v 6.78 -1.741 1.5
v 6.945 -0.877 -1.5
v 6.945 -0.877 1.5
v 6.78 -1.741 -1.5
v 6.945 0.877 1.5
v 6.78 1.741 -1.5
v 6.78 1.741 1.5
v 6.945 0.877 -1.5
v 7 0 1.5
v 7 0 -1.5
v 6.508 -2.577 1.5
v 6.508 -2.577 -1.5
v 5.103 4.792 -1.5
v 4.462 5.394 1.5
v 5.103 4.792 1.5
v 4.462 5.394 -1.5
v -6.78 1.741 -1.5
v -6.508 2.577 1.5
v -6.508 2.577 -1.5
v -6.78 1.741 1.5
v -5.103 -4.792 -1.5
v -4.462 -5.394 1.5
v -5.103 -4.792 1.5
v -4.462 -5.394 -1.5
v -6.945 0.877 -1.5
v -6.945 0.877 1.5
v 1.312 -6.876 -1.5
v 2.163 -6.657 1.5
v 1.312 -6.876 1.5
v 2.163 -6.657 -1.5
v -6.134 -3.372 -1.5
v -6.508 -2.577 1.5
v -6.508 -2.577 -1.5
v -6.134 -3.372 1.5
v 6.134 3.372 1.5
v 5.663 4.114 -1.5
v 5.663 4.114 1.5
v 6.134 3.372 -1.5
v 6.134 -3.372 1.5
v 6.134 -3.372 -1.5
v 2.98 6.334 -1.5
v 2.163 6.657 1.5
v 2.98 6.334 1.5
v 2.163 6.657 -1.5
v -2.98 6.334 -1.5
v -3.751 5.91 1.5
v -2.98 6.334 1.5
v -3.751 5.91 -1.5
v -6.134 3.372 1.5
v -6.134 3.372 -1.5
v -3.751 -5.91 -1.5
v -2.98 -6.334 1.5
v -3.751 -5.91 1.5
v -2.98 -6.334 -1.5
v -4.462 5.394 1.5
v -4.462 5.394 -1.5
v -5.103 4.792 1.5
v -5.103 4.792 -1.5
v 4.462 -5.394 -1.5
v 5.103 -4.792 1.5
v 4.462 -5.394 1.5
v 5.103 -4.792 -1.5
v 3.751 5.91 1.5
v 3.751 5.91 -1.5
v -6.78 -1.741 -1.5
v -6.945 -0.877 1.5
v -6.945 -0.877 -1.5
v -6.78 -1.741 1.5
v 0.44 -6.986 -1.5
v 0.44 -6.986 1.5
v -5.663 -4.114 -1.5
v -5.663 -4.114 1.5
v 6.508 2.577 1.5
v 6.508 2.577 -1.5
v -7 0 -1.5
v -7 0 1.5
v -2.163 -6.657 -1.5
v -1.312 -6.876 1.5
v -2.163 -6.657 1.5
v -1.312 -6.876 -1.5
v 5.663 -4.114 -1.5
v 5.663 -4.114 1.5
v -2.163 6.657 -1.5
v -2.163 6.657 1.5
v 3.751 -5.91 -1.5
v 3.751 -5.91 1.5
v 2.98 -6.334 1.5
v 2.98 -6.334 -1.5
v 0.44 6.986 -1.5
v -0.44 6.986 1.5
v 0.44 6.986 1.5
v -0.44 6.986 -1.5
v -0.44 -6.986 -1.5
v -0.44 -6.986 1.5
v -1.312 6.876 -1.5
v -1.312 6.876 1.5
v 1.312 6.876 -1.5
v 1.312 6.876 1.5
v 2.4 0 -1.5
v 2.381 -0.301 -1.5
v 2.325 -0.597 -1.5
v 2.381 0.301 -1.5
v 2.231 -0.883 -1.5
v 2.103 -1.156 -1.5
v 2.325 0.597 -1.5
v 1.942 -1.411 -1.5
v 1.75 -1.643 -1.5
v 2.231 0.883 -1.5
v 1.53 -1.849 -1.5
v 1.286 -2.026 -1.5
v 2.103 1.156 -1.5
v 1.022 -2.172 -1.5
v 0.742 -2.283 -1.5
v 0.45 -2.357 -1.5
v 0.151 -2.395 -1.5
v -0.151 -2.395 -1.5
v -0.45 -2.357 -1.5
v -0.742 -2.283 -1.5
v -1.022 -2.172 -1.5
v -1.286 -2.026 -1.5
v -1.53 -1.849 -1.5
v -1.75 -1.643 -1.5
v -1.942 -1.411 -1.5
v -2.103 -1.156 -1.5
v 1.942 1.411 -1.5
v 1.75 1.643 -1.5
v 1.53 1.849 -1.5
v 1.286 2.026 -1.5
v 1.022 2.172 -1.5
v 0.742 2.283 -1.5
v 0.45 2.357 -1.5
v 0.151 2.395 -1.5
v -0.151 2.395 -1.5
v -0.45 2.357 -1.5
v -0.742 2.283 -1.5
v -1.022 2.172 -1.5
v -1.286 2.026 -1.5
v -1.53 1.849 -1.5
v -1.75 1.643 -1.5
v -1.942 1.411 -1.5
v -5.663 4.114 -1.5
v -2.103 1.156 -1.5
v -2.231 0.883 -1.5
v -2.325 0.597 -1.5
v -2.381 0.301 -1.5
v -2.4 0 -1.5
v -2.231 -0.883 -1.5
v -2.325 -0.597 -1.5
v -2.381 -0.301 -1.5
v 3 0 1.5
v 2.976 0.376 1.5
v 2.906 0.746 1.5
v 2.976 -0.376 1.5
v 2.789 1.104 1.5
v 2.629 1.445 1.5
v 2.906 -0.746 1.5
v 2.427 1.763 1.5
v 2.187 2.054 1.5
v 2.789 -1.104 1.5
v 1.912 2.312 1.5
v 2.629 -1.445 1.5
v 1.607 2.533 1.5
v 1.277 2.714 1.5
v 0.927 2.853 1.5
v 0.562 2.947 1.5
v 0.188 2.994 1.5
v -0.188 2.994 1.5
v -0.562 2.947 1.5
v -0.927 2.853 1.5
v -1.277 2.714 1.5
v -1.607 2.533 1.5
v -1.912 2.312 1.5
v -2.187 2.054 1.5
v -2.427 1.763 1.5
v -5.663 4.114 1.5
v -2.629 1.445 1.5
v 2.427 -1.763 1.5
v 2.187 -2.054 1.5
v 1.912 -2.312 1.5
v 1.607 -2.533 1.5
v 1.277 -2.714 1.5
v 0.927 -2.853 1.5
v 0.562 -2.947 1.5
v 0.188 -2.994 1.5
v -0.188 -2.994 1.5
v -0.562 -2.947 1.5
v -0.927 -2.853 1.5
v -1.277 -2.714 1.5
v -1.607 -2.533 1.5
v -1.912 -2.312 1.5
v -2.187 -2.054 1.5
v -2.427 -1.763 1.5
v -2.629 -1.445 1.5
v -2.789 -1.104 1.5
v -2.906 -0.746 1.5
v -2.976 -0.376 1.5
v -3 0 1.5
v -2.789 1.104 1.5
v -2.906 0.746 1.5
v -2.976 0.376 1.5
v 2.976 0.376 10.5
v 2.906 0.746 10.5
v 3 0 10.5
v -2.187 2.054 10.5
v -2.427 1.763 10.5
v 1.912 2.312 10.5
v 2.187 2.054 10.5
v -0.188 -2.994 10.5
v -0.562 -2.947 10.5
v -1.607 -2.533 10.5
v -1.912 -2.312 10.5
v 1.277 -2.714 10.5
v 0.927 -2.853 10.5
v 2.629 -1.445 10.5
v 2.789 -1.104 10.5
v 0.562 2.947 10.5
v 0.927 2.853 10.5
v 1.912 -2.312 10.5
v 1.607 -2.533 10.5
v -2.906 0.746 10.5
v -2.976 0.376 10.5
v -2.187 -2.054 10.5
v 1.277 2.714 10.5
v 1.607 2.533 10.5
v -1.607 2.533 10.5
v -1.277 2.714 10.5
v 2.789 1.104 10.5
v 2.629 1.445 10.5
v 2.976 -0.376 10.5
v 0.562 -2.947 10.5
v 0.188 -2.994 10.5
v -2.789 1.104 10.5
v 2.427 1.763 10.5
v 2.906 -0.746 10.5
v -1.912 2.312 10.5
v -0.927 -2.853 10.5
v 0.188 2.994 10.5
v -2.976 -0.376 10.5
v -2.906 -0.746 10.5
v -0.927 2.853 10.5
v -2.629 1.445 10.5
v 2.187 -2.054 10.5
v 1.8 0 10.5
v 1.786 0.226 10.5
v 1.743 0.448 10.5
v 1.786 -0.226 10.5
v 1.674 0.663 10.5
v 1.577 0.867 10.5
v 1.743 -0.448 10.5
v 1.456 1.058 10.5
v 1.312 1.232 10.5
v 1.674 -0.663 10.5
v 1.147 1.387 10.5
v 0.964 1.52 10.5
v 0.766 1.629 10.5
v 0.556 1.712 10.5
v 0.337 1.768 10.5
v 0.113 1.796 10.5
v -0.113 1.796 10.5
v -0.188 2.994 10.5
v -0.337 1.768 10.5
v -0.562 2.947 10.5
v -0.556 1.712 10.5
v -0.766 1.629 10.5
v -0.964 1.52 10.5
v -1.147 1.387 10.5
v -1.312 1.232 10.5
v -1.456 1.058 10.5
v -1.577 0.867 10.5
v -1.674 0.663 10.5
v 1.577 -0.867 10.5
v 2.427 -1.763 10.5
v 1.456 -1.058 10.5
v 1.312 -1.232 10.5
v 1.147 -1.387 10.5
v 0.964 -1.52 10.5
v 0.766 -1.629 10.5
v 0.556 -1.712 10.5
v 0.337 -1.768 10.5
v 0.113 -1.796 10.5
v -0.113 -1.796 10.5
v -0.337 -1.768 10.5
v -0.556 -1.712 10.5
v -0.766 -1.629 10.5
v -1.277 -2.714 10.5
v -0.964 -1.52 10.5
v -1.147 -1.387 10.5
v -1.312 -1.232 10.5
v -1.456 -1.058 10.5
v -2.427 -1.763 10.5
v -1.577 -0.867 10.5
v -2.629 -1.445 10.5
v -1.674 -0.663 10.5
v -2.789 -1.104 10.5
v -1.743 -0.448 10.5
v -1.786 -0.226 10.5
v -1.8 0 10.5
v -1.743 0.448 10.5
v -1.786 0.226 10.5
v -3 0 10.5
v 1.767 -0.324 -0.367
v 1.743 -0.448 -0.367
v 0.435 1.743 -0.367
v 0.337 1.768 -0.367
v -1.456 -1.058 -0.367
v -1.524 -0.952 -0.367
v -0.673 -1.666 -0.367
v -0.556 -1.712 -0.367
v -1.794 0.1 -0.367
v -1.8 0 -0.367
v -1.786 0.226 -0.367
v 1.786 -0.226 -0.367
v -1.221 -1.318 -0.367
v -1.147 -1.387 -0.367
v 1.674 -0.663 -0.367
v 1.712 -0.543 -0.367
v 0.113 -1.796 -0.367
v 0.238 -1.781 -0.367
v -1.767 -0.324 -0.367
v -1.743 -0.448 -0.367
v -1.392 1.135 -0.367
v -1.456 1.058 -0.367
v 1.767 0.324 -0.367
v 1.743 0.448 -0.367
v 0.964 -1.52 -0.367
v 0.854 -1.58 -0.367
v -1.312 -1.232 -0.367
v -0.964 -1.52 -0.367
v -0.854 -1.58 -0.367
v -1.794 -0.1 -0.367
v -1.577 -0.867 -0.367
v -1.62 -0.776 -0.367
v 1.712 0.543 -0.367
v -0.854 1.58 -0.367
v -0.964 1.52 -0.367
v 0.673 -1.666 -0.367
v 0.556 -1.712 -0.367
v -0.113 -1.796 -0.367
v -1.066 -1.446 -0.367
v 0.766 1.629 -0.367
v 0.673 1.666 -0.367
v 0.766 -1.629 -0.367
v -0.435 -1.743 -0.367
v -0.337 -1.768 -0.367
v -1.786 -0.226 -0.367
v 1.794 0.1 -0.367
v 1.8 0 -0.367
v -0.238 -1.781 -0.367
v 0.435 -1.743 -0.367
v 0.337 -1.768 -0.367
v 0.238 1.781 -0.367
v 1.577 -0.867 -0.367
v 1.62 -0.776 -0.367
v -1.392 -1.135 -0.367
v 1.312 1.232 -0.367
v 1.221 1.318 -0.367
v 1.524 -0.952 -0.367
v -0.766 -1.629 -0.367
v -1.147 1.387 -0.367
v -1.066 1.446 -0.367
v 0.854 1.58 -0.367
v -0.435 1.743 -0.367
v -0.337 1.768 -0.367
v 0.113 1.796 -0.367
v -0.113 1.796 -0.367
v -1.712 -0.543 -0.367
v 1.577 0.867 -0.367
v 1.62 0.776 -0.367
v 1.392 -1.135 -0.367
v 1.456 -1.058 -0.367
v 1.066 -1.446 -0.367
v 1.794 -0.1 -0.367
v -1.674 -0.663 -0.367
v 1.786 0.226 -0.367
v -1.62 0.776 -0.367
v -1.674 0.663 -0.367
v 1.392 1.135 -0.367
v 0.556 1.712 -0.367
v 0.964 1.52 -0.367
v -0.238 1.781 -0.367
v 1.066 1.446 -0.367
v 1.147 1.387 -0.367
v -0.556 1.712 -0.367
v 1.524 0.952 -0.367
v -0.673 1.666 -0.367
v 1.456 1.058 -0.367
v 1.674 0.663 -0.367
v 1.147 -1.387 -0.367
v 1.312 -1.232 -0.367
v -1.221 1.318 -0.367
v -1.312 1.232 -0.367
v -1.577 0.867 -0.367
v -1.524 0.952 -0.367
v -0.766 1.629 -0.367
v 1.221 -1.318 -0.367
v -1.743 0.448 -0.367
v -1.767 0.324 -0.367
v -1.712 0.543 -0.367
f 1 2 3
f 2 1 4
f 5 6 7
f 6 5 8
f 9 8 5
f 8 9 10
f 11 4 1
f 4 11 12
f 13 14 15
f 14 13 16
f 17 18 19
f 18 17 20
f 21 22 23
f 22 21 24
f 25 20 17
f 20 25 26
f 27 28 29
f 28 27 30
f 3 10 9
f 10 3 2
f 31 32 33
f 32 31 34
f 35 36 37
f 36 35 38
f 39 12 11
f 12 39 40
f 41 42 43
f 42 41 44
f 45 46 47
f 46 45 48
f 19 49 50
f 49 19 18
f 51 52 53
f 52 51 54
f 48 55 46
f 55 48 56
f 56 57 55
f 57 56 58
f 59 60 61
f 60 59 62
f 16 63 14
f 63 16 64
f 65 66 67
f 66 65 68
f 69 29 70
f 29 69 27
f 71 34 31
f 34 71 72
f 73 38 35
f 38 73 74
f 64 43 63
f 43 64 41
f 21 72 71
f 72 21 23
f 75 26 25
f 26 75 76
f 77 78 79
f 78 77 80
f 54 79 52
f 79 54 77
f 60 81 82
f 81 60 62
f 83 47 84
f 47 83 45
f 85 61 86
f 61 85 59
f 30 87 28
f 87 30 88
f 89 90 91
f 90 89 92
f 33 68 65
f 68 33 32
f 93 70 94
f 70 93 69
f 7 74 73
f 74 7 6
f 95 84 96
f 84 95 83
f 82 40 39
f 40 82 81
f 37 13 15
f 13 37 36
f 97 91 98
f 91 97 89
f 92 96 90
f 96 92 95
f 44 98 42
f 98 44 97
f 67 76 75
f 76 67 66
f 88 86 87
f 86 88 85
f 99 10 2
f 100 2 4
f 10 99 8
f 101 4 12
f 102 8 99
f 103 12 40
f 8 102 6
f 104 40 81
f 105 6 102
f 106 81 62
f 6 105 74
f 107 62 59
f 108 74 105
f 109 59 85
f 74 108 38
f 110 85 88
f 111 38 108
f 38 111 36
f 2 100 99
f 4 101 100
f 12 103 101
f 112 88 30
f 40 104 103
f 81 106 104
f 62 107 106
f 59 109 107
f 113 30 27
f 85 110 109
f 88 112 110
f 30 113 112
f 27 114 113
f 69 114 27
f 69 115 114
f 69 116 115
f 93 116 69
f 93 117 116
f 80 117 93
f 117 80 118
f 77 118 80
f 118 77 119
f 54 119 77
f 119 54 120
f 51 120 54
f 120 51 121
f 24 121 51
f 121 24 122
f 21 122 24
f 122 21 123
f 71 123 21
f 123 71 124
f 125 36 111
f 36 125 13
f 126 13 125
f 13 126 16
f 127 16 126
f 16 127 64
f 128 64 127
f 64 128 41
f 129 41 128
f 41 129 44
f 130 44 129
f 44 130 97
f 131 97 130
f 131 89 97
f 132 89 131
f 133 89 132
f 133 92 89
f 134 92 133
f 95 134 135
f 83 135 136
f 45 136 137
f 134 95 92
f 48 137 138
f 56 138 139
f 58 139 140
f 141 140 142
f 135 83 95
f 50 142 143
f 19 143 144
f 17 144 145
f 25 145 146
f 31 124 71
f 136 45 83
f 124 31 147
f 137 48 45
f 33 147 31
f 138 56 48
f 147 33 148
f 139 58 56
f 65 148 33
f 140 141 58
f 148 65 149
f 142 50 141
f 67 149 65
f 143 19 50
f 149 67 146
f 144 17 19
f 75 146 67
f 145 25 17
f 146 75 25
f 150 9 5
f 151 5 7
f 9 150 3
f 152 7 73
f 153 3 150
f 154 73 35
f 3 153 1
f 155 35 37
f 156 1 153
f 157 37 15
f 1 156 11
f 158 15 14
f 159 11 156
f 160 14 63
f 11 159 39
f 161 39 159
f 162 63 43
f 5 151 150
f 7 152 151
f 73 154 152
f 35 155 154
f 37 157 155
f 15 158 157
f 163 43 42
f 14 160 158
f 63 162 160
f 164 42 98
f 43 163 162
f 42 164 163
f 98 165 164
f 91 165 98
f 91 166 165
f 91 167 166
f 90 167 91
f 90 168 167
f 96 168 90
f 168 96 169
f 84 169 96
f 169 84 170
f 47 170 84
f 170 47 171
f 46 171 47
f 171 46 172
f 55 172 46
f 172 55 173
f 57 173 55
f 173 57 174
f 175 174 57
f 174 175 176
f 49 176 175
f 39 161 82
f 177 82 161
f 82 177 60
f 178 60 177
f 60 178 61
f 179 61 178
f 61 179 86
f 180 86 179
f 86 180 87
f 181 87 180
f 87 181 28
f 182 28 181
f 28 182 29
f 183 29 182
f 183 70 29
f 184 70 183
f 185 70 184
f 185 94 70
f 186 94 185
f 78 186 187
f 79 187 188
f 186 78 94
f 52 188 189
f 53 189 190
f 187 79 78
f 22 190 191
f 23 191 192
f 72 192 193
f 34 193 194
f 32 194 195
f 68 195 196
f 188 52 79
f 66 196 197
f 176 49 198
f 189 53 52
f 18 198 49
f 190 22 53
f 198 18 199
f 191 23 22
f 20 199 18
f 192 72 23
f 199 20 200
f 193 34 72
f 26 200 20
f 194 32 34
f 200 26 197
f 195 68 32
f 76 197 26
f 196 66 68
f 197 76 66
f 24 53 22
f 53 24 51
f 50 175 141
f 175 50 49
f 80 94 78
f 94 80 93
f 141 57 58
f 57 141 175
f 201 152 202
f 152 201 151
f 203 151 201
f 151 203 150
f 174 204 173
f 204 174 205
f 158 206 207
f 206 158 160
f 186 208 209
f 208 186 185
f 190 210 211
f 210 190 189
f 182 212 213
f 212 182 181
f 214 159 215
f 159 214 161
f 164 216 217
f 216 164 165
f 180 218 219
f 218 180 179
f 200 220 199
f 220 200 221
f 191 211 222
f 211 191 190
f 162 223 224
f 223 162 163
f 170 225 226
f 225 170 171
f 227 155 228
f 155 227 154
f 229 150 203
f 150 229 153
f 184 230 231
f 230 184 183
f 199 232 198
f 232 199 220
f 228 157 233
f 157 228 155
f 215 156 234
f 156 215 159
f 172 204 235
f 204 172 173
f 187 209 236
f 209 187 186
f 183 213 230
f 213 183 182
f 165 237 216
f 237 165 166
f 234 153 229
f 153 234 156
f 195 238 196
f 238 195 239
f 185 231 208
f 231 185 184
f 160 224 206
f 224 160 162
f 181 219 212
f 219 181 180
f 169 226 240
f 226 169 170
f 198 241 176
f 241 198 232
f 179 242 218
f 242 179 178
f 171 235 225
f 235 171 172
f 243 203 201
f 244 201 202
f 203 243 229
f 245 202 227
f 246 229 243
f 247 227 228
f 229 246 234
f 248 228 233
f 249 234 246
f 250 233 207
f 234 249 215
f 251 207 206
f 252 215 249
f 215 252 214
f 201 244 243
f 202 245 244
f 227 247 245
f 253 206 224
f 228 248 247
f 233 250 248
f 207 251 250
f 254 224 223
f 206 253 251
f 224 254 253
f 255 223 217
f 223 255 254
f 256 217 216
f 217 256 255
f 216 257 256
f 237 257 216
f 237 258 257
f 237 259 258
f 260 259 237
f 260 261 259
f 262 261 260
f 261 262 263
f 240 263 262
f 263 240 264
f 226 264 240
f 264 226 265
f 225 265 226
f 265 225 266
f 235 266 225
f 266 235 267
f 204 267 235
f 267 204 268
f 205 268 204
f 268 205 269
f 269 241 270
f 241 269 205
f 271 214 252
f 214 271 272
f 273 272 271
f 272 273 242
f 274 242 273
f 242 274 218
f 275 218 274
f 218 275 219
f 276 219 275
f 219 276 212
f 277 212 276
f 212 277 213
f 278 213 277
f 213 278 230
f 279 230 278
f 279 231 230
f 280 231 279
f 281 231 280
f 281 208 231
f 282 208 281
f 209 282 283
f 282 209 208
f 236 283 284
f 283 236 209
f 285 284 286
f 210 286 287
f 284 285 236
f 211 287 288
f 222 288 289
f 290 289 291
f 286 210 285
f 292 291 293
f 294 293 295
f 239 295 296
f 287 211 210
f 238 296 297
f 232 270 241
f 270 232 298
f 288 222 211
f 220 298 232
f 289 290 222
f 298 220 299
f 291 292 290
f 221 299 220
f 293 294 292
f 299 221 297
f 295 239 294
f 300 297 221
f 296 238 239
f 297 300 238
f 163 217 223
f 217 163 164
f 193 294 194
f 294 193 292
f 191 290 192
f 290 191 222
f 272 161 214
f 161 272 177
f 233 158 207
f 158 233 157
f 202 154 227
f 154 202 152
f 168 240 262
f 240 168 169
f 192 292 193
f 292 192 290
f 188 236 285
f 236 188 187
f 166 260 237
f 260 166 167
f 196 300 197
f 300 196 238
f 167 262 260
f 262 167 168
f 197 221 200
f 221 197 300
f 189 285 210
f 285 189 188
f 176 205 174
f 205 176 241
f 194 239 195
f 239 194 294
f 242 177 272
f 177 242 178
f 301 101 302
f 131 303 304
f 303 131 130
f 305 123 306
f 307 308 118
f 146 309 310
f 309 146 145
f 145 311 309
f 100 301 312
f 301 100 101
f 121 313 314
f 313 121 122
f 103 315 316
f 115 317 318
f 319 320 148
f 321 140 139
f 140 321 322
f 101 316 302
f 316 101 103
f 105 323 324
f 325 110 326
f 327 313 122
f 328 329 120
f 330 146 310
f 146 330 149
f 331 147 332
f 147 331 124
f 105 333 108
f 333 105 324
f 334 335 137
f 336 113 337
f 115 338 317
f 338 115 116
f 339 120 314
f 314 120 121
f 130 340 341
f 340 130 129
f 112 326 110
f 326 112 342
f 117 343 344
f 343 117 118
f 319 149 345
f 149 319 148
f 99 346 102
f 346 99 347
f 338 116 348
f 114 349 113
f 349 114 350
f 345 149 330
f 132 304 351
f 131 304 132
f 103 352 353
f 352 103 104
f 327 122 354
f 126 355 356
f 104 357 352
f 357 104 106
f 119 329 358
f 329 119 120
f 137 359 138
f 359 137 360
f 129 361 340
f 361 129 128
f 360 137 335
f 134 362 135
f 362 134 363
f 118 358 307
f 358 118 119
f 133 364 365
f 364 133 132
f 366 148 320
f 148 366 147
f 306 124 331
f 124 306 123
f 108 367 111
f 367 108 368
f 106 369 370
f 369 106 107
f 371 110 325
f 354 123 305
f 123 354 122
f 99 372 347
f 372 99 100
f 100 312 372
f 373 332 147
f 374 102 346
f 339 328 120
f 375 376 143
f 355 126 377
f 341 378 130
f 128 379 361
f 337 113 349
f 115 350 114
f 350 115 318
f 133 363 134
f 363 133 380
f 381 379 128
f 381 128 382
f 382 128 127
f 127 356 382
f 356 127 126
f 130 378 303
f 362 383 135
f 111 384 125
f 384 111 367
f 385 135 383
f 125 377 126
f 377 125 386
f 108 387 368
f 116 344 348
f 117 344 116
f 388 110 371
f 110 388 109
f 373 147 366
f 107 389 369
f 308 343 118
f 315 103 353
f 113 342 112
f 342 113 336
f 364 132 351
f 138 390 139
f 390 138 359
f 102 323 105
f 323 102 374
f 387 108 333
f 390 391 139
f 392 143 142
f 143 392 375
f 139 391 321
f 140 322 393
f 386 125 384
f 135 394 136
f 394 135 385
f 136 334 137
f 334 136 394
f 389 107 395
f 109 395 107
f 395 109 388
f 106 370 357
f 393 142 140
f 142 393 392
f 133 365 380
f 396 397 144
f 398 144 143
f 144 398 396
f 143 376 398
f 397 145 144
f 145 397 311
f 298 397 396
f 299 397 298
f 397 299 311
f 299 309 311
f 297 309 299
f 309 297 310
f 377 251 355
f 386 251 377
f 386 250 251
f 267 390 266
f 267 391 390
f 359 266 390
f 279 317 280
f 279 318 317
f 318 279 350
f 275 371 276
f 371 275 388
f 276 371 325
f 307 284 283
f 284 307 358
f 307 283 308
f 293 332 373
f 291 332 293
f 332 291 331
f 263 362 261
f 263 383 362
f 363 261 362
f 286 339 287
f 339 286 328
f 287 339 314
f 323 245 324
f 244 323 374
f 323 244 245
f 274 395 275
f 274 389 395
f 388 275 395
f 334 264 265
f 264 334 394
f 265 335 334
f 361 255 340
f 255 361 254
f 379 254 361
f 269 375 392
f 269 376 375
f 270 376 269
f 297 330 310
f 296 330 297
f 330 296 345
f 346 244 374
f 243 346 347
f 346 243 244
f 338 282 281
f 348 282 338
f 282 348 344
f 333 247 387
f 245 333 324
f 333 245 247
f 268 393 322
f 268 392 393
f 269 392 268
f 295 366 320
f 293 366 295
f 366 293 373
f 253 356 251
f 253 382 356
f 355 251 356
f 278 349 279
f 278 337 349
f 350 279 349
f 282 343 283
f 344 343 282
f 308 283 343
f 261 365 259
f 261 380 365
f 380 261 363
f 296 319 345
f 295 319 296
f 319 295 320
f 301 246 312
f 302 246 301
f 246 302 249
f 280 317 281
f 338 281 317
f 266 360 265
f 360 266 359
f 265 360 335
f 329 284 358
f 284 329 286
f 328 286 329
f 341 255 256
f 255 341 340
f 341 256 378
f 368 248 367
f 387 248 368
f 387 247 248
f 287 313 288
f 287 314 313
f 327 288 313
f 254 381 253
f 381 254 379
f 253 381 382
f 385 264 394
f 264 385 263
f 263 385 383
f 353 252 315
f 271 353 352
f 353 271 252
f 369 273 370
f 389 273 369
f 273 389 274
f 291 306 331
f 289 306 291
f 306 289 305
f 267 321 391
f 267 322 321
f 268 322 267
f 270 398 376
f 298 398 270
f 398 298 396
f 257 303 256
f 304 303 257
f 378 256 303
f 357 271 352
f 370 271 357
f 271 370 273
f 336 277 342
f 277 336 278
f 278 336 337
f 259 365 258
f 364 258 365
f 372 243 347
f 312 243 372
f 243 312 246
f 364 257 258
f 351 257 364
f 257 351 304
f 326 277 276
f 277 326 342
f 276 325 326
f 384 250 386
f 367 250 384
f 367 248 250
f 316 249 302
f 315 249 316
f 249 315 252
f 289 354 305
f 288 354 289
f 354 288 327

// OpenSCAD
$fn = 50;


difference() {
	union() {
		translate(v = [0, 0, -1.5000000000]) {
			cylinder(h = 3, r = 7.0000000000);
		}
		translate(v = [0, 0, -1.5000000000]) {
			cylinder(h = 12, r = 3.0000000000);
		}
	}
	union() {
		translate(v = [0, 0, -1.5000000000]) {
			rotate(a = [0, 180, 0]) {
				difference() {
					union() {
						translate(v = [0, 0, -1.7000000000]) {
							cylinder(h = 1.7000000000, r1 = 1.5000000000, r2 = 2.4000000000);
						}
						translate(v = [0, 0, -12.0000000000]) {
							cylinder(h = 12, r = 1.5000000000);
						}
						translate(v = [0, 0, -12.0000000000]) {
							cylinder(h = 12, r = 1.8000000000);
						}
						translate(v = [0, 0, -12.0000000000]) {
							cylinder(h = 12, r = 1.5000000000);
						}
					}
					union();
				}
			}
		}
		translate(v = [0, 0, -100.0000000000]) {
			cylinder(h = 200, r = 1.5000000000);
		}
	}
}
